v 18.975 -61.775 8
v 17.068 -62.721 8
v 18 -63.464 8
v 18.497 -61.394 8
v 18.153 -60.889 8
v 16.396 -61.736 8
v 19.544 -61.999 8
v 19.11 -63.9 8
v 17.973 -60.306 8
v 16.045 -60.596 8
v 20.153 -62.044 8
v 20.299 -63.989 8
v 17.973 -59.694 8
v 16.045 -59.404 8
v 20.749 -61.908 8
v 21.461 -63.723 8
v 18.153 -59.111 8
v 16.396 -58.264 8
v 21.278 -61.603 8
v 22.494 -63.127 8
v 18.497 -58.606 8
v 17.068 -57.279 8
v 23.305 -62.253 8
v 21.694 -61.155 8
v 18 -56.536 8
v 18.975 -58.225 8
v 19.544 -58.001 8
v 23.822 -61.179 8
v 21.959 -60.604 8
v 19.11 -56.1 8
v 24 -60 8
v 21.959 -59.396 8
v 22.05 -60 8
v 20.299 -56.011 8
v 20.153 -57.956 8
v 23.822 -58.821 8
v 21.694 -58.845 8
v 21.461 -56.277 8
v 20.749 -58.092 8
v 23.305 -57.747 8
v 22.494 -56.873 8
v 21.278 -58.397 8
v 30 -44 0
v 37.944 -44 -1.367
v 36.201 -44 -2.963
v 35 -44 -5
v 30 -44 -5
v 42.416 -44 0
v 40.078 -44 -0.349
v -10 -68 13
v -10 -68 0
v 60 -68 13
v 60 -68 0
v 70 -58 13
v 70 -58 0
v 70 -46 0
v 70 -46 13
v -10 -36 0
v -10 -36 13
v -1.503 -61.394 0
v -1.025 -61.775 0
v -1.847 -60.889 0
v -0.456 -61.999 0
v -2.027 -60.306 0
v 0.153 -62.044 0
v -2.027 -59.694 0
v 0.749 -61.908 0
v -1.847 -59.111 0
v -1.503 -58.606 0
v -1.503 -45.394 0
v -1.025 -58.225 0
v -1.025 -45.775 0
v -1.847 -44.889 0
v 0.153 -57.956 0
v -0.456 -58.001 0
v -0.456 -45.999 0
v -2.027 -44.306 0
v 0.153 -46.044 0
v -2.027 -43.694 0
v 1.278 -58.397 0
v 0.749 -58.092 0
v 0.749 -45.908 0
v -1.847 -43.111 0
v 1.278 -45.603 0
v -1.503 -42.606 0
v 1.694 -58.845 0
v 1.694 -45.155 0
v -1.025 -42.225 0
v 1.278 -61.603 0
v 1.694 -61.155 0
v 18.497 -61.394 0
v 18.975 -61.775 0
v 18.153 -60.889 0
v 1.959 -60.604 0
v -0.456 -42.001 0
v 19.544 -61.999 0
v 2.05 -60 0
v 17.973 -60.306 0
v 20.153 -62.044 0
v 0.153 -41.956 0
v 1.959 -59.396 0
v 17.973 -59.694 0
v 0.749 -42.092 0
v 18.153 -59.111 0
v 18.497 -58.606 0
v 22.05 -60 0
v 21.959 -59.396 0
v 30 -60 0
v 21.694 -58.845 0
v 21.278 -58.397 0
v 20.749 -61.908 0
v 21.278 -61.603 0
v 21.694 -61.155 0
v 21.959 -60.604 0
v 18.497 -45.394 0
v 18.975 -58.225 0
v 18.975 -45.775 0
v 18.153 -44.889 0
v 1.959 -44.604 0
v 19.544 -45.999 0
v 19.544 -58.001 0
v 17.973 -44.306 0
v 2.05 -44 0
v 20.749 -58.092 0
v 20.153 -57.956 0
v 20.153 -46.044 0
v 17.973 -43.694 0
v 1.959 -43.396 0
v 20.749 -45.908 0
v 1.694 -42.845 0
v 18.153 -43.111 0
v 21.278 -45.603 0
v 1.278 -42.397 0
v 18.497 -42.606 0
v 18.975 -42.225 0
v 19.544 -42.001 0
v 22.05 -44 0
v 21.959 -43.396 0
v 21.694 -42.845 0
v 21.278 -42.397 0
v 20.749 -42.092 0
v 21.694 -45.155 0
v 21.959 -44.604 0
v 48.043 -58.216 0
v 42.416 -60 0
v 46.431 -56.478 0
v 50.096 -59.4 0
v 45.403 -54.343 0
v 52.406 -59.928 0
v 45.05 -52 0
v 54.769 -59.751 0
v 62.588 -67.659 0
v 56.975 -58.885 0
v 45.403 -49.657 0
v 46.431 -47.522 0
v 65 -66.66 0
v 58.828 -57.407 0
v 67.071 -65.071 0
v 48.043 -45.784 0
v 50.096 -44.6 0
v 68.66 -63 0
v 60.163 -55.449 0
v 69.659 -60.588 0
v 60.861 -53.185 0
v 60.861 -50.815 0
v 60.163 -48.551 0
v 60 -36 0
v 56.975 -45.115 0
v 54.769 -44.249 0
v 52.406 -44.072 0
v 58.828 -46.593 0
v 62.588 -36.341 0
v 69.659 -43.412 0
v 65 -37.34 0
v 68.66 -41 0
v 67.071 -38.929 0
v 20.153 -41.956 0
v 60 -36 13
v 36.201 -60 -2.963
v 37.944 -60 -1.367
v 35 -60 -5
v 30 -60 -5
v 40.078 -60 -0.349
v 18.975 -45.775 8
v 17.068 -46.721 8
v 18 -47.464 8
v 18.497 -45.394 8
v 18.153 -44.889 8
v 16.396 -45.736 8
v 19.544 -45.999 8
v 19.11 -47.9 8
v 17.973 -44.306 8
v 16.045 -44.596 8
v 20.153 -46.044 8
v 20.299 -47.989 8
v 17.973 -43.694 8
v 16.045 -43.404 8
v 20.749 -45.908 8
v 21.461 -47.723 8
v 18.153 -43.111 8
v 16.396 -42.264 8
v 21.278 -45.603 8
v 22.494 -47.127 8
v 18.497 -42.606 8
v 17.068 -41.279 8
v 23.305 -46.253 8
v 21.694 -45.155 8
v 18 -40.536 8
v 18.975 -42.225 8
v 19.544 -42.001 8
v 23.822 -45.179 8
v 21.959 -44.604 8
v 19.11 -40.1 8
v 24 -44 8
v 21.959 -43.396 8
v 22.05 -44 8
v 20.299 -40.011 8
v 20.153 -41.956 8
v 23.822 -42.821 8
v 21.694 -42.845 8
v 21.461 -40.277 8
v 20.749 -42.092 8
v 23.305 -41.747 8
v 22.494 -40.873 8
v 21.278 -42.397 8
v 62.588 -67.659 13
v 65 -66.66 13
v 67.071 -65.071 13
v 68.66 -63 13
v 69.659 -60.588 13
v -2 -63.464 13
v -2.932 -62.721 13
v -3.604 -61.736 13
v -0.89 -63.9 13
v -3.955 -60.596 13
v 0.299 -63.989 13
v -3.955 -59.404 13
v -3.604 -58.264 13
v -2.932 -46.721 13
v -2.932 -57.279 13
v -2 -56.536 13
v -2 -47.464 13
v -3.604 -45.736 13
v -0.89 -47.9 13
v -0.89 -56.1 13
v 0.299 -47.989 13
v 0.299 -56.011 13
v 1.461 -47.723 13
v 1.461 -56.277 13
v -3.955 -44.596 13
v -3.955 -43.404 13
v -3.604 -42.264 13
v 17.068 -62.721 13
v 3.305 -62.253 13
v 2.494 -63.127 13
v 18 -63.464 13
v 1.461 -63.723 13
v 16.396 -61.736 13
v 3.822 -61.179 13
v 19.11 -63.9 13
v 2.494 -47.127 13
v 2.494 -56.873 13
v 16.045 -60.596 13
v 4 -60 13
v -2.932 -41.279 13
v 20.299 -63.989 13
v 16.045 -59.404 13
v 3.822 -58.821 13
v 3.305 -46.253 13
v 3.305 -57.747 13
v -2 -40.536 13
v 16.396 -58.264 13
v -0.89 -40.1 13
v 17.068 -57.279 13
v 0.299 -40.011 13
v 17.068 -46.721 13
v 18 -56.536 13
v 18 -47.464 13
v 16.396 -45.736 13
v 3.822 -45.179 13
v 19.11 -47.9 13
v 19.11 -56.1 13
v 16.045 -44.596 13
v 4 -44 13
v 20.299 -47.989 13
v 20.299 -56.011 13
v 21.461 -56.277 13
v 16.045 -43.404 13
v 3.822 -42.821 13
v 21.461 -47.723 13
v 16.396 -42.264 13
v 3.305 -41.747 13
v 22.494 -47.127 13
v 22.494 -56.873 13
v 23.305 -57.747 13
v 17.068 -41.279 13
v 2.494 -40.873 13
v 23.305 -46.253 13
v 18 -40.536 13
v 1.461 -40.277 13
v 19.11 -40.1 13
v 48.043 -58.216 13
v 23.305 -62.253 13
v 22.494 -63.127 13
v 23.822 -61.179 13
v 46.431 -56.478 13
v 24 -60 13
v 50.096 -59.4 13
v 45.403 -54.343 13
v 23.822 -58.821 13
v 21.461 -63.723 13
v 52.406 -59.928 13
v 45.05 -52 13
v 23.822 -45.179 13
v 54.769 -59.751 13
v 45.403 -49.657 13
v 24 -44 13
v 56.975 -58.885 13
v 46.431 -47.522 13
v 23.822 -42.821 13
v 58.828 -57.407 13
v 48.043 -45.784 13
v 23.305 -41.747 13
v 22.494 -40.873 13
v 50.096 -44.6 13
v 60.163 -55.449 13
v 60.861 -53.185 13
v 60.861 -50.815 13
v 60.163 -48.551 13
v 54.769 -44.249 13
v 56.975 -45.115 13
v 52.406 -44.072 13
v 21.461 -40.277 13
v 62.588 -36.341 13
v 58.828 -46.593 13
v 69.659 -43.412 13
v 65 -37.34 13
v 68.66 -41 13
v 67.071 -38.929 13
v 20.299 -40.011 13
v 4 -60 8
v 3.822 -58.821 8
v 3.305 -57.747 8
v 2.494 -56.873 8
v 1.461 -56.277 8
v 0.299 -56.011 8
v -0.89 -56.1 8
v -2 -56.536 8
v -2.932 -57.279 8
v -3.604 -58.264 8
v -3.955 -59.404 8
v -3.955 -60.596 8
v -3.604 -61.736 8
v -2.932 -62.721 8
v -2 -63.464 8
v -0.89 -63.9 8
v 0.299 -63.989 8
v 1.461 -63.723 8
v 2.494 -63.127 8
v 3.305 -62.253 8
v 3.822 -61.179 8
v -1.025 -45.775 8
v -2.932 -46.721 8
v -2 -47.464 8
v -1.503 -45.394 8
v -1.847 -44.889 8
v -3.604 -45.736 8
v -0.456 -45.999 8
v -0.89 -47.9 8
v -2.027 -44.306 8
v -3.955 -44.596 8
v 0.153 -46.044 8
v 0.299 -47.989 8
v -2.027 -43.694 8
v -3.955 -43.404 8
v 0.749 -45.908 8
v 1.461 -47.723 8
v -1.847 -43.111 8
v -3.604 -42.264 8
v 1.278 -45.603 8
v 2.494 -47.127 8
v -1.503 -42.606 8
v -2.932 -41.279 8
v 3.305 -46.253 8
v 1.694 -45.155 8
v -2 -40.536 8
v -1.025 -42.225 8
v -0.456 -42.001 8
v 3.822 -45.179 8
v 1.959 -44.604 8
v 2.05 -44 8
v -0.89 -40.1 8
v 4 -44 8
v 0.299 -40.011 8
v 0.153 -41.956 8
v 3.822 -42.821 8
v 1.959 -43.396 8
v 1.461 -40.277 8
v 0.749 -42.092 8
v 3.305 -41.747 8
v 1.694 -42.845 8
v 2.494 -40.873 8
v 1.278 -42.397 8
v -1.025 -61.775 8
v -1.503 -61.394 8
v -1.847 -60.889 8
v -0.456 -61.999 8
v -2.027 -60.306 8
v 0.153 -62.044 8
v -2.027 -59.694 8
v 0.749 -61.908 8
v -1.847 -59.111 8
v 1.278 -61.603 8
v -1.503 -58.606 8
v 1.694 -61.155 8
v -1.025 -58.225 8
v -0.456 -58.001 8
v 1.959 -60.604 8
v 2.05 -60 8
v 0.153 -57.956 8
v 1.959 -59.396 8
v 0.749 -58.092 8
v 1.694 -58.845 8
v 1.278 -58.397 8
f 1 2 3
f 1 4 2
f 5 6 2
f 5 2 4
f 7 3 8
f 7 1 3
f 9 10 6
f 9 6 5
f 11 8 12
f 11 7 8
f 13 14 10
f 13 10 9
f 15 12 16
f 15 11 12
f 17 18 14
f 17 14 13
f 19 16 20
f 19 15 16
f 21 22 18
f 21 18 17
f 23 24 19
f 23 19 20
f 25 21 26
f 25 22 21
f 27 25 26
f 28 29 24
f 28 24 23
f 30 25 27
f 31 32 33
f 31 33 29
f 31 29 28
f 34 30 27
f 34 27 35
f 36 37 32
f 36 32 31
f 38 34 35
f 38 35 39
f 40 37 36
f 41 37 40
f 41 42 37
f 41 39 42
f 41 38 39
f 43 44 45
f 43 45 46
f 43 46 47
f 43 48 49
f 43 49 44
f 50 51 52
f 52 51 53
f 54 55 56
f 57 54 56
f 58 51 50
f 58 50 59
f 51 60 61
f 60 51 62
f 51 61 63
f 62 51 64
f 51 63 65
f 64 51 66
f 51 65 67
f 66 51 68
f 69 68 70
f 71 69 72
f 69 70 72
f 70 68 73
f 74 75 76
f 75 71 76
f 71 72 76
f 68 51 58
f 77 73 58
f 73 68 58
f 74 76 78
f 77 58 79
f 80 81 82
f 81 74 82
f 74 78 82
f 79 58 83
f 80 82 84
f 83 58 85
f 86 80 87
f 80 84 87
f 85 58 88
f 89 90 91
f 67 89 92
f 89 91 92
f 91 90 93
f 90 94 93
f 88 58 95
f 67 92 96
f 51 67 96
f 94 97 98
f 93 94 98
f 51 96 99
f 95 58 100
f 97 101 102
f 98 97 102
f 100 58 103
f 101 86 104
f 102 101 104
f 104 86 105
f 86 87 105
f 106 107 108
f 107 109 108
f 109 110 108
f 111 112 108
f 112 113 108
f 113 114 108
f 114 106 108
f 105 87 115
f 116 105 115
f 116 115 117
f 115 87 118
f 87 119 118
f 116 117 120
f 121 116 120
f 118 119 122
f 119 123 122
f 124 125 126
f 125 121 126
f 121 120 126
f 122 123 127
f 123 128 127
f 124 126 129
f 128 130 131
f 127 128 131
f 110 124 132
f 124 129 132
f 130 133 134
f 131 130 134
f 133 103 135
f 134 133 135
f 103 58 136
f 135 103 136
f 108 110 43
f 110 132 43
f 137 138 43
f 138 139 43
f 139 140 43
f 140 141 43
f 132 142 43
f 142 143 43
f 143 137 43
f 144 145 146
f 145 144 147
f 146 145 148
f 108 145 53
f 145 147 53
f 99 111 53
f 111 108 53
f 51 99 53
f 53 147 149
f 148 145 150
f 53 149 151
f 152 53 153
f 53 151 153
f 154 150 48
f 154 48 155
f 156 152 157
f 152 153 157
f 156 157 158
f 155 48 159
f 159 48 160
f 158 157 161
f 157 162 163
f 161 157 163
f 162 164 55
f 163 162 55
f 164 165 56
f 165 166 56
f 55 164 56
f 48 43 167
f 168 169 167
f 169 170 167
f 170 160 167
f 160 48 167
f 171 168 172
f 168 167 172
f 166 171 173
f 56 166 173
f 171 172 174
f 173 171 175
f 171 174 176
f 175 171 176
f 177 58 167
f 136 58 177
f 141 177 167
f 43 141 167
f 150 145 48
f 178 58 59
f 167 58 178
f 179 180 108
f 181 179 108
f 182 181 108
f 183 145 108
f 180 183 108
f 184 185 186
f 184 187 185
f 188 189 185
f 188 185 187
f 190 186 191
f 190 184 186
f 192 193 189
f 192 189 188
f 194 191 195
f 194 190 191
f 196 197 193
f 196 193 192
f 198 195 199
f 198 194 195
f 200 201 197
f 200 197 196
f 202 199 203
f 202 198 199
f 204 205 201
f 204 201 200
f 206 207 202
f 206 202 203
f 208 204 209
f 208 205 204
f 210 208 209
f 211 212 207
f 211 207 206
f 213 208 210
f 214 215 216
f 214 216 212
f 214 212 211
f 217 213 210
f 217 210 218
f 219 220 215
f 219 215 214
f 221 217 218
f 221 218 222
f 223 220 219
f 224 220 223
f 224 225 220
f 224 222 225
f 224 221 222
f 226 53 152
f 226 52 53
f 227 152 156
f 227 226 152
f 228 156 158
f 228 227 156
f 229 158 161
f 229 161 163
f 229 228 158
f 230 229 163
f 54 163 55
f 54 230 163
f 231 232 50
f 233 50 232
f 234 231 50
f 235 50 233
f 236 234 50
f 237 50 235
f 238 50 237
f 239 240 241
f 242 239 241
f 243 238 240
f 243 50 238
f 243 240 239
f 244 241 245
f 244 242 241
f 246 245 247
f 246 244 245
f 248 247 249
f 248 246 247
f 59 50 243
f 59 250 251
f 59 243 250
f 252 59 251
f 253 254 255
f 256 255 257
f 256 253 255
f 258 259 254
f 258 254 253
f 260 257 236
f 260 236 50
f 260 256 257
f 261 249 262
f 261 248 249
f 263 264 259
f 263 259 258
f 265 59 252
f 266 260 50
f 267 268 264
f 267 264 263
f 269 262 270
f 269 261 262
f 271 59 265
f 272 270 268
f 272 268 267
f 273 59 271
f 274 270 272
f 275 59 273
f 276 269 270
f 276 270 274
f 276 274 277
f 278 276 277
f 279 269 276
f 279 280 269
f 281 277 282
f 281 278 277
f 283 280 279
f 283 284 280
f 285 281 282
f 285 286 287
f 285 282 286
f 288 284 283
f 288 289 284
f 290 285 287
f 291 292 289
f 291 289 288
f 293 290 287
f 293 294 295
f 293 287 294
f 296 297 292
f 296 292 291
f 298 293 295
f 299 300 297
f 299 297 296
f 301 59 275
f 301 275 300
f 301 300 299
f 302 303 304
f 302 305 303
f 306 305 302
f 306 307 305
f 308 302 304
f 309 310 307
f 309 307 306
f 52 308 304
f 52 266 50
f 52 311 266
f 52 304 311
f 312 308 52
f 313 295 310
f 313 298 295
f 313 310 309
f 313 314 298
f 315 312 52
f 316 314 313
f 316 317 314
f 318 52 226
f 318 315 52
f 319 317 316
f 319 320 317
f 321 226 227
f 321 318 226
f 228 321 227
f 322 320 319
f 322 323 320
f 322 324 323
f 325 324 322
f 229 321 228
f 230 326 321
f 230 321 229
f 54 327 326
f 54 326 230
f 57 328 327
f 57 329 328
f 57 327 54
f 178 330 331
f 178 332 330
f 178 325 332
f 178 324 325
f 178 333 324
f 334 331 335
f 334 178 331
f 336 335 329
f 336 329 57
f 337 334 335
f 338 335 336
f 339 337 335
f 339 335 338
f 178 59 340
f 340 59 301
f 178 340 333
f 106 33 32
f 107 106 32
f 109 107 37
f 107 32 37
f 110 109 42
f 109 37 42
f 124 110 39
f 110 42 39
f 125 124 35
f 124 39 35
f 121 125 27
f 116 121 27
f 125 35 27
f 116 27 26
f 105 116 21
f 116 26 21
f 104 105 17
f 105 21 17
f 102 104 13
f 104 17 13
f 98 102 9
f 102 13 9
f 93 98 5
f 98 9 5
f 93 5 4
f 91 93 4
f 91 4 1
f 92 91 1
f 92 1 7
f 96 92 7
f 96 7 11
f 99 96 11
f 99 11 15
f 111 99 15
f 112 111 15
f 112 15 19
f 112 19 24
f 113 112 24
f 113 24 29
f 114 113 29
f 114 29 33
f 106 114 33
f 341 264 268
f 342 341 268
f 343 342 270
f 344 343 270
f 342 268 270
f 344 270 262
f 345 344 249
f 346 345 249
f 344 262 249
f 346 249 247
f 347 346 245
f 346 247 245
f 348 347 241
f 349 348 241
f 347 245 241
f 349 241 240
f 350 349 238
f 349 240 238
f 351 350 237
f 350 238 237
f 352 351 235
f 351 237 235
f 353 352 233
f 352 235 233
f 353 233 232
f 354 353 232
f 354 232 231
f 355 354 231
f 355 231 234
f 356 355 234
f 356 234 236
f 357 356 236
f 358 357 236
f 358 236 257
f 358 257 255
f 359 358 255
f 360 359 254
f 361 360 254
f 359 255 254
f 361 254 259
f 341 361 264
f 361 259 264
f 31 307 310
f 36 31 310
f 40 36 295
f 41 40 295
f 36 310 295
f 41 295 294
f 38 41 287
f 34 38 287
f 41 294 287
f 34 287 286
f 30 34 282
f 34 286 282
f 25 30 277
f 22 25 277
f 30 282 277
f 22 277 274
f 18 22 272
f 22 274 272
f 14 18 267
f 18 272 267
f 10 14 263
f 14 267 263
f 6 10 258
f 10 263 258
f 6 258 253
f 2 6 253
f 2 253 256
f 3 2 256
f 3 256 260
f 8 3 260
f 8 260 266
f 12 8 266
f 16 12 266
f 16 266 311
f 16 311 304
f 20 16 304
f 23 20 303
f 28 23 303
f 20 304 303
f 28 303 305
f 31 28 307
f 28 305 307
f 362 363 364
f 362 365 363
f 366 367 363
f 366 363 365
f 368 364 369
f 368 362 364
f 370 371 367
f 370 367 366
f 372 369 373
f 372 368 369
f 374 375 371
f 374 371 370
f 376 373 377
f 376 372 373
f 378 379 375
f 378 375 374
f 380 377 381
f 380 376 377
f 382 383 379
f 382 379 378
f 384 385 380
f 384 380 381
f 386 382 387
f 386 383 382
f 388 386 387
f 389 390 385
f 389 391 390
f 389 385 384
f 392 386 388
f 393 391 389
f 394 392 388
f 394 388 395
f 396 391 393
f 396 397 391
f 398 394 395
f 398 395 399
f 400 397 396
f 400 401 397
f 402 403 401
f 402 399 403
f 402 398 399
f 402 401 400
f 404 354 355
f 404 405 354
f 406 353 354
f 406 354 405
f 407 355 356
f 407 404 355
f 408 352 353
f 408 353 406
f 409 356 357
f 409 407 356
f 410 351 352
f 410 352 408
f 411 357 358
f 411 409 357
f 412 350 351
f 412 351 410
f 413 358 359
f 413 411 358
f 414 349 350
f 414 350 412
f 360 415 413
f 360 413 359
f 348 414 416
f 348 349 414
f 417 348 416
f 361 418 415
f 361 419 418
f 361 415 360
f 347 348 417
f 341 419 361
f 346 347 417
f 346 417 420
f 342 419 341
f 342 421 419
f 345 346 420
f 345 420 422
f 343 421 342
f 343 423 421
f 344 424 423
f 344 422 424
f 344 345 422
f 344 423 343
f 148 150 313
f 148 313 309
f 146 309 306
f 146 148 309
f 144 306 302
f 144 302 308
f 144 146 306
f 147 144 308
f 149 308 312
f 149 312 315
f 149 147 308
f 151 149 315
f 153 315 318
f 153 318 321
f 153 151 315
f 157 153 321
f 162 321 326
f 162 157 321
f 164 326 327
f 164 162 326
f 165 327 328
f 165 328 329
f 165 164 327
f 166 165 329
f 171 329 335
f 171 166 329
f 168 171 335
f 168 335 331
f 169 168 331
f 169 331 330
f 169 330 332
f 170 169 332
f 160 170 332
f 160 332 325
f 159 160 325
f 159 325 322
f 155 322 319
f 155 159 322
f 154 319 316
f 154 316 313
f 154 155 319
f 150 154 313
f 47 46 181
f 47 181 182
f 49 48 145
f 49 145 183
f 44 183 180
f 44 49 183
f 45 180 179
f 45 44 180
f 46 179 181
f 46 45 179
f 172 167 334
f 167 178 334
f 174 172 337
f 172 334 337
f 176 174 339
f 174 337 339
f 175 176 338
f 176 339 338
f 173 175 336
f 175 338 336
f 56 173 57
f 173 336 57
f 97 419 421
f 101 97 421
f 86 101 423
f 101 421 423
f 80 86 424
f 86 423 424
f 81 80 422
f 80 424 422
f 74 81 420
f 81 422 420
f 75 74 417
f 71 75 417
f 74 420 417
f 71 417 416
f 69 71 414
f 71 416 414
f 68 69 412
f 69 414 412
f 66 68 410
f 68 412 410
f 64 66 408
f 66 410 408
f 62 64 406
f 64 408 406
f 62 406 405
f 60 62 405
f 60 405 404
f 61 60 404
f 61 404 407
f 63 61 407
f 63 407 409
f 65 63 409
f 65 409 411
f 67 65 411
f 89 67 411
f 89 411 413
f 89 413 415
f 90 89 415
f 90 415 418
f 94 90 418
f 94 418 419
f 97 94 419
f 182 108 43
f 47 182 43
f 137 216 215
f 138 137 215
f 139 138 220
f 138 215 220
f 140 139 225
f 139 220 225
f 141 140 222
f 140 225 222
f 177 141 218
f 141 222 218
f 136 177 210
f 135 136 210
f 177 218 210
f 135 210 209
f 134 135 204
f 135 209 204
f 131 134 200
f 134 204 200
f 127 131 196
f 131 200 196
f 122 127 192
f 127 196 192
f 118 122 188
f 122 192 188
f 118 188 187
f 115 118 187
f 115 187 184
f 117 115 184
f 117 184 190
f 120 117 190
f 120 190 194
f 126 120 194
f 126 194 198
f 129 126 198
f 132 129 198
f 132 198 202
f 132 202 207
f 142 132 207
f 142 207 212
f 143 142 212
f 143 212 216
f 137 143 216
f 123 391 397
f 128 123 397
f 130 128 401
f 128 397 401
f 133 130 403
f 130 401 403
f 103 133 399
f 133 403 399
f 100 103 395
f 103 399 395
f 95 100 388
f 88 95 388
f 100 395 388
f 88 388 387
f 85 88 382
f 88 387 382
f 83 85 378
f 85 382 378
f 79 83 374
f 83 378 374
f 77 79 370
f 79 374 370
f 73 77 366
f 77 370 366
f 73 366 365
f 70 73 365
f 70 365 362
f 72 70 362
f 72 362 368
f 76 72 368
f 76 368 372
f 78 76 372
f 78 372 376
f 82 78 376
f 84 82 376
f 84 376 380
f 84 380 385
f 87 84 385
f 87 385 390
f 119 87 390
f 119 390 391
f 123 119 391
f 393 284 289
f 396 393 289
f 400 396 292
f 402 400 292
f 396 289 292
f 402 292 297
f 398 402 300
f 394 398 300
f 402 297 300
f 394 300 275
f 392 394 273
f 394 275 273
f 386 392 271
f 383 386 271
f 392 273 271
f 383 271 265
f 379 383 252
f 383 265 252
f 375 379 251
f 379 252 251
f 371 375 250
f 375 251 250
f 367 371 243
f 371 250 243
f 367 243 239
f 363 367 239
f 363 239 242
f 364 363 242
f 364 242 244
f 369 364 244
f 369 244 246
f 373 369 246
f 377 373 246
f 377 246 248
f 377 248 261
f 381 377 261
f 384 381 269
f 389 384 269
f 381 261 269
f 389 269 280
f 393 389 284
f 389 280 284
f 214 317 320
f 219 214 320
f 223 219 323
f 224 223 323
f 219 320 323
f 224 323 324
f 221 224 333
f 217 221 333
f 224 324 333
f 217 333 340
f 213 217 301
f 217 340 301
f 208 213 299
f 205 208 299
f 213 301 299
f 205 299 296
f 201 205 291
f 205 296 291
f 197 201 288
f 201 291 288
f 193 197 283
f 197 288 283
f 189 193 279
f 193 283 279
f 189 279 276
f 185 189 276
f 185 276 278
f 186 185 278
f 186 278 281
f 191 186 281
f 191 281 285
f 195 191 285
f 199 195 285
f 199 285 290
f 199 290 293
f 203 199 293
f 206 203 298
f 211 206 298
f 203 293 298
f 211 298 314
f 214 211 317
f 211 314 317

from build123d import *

# Parameters (mm, degrees)
CROQUIS1_W              = 80
CROQUIS1_H              = 32
CROQUIS1_R              = 7.95
SALIENTE_EXTRUIR1_DEPTH = 13
CORTAR_EXTRUIR1_REACH   = 100.453
CROQUIS2_R              = 2.05
CROQUIS3_R              = 4
CORTAR_EXTRUIR2_DEPTH   = 5
REDONDEO1_R             = 10
CROQUIS4_W              = 5
CROQUIS4_H              = 16
SALIENTE_EXTRUIR2_DEPTH = 5
REDONDEO2_R             = 8


with BuildPart() as part:
    # Croquis1 → Saliente-Extruir1 (new body)
    with BuildSketch(Plane.XY):
        with Locations((30, -52)):
            Rectangle(CROQUIS1_W, CROQUIS1_H)
        with Locations(Location((53, -52, 0), (0, 0, 180))):
            Circle(CROQUIS1_R, mode=Mode.SUBTRACT)
    extrude(amount=SALIENTE_EXTRUIR1_DEPTH)

    # Croquis2 → Cortar-Extruir1 (cut, up to next)
    with BuildSketch(Plane.XY.offset(13), mode=Mode.PRIVATE) as cortar_extruir1_sk1:
        with Locations((0, -44)):
            Circle(CROQUIS2_R)
    cortar_extruir1_tool1 = extrude(cortar_extruir1_sk1.sketch, amount=-CORTAR_EXTRUIR1_REACH, mode=Mode.PRIVATE) & part.part
    # Croquis2 → Cortar-Extruir1 (cut, up to next)
    with BuildSketch(Plane.XY.offset(13), mode=Mode.PRIVATE) as cortar_extruir1_sk2:
        with Locations((20, -44)):
            Circle(CROQUIS2_R)
    cortar_extruir1_tool2 = extrude(cortar_extruir1_sk2.sketch, amount=-CORTAR_EXTRUIR1_REACH, mode=Mode.PRIVATE) & part.part
    # Croquis2 → Cortar-Extruir1 (cut, up to next)
    with BuildSketch(Plane.XY.offset(13), mode=Mode.PRIVATE) as cortar_extruir1_sk3:
        with Locations((0, -60)):
            Circle(CROQUIS2_R)
    cortar_extruir1_tool3 = extrude(cortar_extruir1_sk3.sketch, amount=-CORTAR_EXTRUIR1_REACH, mode=Mode.PRIVATE) & part.part
    # Croquis2 → Cortar-Extruir1 (cut, up to next)
    with BuildSketch(Plane.XY.offset(13), mode=Mode.PRIVATE) as cortar_extruir1_sk4:
        with Locations((20, -60)):
            Circle(CROQUIS2_R)
    cortar_extruir1_tool4 = extrude(cortar_extruir1_sk4.sketch, amount=-CORTAR_EXTRUIR1_REACH, mode=Mode.PRIVATE) & part.part
    add(cortar_extruir1_tool1.solids().sort_by_distance((0, -44, 13))[0], mode=Mode.SUBTRACT)
    add(cortar_extruir1_tool2.solids().sort_by_distance((20, -44, 13))[0], mode=Mode.SUBTRACT)
    add(cortar_extruir1_tool3.solids().sort_by_distance((0, -60, 13))[0], mode=Mode.SUBTRACT)
    add(cortar_extruir1_tool4.solids().sort_by_distance((20, -60, 13))[0], mode=Mode.SUBTRACT)

    # Croquis3 → Cortar-Extruir2 (cut)
    with BuildSketch(Plane.XY.offset(13)):
        with Locations((0, -44)):
            Circle(CROQUIS3_R)
        with Locations((20, -44)):
            Circle(CROQUIS3_R)
        with Locations((20, -60)):
            Circle(CROQUIS3_R)
        with Locations((0, -60)):
            Circle(CROQUIS3_R)
    extrude(amount=-CORTAR_EXTRUIR2_DEPTH, mode=Mode.SUBTRACT)

    # Redondeo1
    redondeo1_edges = [part.edges().sort_by_distance(p)[0] for p in [
        (70, -36, 6.5),
        (70, -68, 6.5),
    ]]
    fillet(redondeo1_edges, radius=REDONDEO1_R)

    # Croquis4 → Saliente-Extruir2 (add)
    with BuildSketch(Plane(origin=(0, 0, 0), x_dir=(-1, 0, 0), z_dir=(0, 0, -1))):
        with Locations((-32.5, -52)):
            Rectangle(CROQUIS4_W, CROQUIS4_H)
    extrude(amount=SALIENTE_EXTRUIR2_DEPTH)

    # Redondeo2
    # the kernel refuses this fillet: 8 mm, written as the material it adds along each edge
    with BuildSketch(Plane(origin=(35, -44, 0), x_dir=(1, 0, 0), z_dir=(0, -1, 0))) as redondeo2_piece_1:
        with BuildLine():
            CenterArc((7.416198487, -8), REDONDEO2_R, 90, 67.975687163)
            Line((0, -5), (-0.14832397, -4.94))
            ThreePointArc((-0.14832397, -4.94), (-0.16, -2.5), (-0.16, 0))
            Line((-0.16, 0), (0, 0.16))
            Line((0, 0.16), (7.416198487, 0.16))
            Line((7.416198487, 0.16), (7.416198487, 0))
        make_face()
    extrude(amount=16)


solid = part.part
